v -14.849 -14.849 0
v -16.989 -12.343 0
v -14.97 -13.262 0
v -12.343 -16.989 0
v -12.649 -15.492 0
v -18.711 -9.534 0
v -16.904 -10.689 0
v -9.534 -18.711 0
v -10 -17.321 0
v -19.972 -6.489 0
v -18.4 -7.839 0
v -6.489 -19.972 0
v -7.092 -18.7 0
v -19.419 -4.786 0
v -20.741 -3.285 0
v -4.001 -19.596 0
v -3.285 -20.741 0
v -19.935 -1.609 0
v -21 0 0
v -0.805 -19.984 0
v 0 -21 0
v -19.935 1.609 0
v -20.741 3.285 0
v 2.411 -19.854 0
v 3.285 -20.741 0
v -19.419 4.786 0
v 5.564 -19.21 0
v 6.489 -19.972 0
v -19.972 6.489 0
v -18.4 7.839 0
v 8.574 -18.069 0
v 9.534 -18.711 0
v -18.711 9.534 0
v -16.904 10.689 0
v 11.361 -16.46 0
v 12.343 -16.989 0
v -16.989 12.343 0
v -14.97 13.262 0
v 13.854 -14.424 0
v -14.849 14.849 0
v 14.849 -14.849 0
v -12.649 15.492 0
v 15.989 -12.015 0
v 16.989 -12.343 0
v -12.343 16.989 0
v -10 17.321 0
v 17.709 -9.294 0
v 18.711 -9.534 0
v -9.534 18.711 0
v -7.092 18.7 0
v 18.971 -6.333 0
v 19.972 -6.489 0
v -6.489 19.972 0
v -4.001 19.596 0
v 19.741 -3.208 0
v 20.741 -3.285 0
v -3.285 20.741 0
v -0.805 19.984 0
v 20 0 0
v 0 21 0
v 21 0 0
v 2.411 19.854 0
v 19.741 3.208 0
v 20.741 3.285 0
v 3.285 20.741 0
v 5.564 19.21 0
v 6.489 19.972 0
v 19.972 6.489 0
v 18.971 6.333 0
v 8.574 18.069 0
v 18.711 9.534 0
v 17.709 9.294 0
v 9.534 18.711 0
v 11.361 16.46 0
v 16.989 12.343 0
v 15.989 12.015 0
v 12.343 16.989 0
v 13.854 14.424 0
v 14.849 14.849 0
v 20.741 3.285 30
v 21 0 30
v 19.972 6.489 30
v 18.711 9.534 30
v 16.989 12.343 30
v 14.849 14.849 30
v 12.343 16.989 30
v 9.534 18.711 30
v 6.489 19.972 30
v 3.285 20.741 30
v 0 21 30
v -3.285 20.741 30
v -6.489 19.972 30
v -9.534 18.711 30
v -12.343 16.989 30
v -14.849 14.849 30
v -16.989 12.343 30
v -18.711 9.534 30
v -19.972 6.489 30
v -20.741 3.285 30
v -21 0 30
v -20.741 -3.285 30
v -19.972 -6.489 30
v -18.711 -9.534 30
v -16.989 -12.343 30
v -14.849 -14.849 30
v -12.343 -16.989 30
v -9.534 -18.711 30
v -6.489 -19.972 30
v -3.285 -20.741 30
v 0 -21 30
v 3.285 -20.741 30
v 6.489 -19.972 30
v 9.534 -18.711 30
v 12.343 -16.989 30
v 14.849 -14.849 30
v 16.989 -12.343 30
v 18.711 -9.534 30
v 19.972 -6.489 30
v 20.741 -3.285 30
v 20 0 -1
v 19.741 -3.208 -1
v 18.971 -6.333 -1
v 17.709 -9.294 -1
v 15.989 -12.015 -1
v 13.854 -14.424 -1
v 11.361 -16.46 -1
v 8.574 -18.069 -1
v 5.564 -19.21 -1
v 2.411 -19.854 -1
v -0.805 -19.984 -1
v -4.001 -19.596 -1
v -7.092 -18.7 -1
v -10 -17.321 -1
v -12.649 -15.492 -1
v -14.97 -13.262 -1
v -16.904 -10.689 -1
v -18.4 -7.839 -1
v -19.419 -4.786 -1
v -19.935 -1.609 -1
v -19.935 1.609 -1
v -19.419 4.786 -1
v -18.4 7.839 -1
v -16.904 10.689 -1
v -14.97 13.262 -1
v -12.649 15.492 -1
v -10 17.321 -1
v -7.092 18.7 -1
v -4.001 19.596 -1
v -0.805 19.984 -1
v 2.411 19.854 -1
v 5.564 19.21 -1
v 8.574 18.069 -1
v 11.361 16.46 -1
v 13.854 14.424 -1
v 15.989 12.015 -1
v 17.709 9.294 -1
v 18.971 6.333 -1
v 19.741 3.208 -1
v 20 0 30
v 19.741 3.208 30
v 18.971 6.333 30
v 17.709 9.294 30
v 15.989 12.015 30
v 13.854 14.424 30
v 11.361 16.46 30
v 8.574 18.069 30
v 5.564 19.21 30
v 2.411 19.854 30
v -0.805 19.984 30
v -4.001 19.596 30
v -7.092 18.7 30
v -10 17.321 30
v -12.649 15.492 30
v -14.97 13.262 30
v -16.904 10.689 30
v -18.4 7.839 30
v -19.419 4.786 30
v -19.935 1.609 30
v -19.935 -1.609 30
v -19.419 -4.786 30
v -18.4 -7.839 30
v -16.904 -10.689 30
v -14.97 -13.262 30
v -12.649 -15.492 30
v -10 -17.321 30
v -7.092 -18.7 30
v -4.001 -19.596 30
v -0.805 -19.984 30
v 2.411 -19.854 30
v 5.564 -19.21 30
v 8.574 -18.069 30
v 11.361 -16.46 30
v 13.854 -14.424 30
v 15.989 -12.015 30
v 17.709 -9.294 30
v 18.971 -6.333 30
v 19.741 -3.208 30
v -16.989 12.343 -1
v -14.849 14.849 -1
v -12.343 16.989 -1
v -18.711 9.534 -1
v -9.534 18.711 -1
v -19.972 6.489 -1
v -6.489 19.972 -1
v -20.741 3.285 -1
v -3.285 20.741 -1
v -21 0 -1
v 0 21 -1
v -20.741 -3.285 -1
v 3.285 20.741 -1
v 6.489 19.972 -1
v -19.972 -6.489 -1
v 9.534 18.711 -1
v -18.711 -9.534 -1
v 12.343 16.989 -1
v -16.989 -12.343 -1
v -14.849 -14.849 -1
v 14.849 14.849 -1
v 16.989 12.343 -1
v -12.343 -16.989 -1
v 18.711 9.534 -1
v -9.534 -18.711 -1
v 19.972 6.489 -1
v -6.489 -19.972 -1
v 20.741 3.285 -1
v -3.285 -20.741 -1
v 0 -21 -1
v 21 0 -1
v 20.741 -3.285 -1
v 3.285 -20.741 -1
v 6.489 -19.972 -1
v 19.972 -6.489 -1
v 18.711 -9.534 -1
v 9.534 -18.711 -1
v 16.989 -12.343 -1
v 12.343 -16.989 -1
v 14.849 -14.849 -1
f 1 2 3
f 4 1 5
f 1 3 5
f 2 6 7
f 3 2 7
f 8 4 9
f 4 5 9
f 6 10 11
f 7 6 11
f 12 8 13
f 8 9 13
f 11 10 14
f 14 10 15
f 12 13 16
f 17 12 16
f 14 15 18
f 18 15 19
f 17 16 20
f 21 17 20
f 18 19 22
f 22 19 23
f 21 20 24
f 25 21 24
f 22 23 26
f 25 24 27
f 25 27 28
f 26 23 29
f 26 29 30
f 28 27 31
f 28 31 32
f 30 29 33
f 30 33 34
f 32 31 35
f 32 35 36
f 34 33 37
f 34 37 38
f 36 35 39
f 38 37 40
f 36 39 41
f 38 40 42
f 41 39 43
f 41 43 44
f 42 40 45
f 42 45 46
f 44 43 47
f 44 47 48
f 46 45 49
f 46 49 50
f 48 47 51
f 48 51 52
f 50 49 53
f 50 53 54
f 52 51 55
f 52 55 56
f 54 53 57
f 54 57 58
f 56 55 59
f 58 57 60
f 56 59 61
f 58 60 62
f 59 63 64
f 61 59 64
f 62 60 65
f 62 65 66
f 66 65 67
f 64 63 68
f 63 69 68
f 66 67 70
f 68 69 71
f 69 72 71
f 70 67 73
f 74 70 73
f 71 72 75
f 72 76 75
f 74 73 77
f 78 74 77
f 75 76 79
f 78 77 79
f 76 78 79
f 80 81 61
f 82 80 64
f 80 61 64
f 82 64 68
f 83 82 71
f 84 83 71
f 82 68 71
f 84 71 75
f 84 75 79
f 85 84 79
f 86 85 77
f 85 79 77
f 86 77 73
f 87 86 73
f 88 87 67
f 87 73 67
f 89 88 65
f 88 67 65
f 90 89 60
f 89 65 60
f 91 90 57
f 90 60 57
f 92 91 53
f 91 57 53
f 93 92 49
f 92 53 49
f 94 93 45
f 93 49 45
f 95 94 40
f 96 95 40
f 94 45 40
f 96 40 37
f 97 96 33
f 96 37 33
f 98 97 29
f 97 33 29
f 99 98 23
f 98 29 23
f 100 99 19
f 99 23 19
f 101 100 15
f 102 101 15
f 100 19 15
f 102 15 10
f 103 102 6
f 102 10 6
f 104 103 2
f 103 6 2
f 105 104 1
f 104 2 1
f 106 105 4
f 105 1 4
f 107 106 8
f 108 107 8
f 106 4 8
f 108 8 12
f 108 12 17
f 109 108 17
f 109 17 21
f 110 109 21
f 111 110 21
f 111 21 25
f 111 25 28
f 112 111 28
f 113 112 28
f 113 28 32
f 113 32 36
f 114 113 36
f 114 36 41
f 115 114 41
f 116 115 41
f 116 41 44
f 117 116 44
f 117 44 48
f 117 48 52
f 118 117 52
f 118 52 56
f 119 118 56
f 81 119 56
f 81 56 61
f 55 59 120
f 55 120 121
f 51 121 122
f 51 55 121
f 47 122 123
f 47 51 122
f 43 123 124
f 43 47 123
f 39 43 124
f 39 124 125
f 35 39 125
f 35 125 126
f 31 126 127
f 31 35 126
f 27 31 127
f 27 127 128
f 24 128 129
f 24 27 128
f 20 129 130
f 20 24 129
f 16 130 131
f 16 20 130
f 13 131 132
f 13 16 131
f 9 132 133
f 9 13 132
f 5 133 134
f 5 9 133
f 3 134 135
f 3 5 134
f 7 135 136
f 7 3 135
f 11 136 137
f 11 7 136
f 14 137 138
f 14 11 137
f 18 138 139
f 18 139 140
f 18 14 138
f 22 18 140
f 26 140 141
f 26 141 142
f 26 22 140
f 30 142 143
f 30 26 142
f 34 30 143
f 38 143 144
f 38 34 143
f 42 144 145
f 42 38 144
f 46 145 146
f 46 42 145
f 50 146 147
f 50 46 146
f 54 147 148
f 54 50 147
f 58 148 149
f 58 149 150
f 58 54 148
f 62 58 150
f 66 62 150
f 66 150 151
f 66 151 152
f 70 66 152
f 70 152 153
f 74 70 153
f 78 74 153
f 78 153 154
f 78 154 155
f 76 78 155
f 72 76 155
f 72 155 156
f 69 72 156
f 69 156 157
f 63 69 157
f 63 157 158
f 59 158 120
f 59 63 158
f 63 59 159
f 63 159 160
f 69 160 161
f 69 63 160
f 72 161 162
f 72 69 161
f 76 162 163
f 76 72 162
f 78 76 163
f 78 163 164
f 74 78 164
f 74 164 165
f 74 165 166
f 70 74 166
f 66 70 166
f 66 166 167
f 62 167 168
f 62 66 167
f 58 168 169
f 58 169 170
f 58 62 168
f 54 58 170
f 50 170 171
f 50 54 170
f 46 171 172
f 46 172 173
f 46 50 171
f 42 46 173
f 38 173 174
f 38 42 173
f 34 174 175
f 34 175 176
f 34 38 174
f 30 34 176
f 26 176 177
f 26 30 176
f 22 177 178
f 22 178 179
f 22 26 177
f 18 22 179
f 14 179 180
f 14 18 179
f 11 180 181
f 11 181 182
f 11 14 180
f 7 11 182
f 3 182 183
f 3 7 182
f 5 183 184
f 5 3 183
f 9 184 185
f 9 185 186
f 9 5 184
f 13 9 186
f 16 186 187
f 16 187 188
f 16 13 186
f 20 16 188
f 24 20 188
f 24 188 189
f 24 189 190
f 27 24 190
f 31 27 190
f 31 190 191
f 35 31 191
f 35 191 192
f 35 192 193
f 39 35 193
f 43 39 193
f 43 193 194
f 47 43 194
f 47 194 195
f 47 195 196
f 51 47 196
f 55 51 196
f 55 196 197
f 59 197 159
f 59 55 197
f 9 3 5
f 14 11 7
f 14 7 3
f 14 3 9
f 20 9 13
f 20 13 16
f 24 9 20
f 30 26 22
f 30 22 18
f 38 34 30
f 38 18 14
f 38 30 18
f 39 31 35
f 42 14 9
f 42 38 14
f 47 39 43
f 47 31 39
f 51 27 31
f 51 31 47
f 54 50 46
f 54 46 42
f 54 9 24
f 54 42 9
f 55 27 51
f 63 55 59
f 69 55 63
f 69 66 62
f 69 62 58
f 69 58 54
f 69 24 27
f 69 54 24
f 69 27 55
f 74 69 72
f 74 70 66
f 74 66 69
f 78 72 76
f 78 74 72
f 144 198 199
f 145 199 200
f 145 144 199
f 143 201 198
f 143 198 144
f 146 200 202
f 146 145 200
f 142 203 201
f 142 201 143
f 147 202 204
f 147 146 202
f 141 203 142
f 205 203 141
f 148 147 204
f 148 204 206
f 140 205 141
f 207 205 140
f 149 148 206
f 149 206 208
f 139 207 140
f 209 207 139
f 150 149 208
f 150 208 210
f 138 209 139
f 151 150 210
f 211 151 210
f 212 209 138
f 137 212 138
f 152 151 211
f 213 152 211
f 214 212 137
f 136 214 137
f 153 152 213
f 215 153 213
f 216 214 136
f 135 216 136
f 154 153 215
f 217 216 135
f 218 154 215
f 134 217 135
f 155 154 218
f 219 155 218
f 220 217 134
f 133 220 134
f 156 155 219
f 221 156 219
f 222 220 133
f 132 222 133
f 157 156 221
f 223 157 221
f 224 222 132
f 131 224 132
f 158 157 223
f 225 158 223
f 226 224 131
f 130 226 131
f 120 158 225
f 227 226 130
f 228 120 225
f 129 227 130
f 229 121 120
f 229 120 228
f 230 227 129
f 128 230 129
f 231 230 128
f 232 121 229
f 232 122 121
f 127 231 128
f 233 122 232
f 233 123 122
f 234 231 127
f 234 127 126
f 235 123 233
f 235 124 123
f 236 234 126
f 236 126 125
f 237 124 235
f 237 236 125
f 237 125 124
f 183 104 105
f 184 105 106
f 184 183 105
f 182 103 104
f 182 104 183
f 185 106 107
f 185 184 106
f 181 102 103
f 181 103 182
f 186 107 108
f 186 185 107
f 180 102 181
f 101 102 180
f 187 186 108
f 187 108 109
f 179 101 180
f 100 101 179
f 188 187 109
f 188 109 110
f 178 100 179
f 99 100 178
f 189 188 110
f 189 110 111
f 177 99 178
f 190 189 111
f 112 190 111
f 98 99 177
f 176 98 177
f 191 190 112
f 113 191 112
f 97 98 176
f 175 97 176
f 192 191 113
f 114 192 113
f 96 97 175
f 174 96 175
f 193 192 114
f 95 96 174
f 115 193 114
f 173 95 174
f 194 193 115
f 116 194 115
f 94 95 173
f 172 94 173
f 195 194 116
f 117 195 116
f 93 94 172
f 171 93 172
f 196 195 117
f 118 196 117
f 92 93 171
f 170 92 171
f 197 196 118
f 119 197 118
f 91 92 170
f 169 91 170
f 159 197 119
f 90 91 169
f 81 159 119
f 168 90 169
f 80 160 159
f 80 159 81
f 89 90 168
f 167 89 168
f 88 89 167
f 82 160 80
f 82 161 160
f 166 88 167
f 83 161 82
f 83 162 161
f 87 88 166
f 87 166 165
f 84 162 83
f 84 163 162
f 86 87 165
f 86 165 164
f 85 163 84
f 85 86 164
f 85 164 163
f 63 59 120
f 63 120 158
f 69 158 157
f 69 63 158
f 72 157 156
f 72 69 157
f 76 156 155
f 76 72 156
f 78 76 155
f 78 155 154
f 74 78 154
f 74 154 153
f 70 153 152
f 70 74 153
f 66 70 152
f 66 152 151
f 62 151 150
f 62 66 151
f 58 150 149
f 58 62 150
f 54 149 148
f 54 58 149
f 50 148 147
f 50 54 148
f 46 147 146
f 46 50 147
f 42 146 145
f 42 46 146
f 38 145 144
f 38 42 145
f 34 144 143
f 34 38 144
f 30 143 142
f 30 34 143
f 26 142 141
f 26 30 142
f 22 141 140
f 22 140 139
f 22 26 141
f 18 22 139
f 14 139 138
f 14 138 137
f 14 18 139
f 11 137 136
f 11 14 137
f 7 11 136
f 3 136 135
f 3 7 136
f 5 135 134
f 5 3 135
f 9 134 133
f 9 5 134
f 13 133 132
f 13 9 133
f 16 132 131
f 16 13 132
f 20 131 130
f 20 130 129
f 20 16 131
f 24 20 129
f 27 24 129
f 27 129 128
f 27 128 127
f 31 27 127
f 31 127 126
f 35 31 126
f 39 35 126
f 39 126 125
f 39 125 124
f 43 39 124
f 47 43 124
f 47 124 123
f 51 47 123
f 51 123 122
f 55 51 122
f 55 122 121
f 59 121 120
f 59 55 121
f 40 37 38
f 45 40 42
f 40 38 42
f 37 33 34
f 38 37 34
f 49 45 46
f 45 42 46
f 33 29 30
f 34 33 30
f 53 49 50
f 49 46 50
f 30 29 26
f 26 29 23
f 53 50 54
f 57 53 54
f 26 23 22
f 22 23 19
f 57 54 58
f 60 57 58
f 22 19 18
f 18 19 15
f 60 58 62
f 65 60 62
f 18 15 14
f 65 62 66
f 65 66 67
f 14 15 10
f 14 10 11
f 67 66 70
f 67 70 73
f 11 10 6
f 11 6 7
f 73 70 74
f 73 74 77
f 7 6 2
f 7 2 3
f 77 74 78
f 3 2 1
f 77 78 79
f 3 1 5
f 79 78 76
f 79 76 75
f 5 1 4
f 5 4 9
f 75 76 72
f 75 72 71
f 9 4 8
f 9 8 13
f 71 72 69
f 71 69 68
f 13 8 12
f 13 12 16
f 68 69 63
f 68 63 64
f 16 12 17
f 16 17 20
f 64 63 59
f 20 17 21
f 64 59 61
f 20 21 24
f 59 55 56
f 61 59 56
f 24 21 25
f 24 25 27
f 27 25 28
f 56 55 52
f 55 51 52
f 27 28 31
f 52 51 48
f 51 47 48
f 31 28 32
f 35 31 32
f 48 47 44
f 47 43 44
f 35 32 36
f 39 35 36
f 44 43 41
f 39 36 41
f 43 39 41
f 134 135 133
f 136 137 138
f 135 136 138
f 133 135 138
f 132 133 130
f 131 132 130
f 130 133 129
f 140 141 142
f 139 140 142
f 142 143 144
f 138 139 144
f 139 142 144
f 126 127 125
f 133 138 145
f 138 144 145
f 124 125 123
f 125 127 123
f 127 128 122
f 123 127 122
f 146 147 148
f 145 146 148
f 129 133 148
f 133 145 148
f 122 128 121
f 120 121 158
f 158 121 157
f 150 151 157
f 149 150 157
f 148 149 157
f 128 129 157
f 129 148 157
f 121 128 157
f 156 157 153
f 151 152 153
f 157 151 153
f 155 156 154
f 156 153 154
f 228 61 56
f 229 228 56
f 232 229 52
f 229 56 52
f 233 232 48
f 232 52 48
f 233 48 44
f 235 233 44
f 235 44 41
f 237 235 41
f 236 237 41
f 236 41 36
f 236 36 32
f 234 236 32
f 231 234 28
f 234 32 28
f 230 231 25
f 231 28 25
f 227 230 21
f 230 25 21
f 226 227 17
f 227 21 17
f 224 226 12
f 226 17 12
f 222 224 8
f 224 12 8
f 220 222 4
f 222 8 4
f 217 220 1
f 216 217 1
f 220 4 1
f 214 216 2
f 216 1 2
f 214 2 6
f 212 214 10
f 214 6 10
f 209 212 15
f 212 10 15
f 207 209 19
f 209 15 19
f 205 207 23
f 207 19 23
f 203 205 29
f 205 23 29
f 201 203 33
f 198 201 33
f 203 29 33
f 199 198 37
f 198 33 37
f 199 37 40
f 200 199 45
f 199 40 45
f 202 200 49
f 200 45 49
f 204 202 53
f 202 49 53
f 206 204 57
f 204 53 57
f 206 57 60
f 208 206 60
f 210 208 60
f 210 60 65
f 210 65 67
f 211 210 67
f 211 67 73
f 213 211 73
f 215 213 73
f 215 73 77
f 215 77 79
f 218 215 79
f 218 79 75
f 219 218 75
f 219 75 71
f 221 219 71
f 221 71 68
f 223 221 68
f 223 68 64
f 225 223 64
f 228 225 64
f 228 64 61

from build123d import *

# Parameters (mm, degrees)
F0_R        = 21
F0_R_2      = 20
F1_DEPTH    = 30
F2_DEPTH    = 1
F1_FACE_R   = 21
F1_FACE_R_2 = 20
F3_DEPTH    = 1


with BuildPart() as f1:
    # F0 (on Top) → F1 (new body)
    with BuildSketch(Plane.XY):
        Circle(F0_R)
        Circle(F0_R_2, mode=Mode.SUBTRACT)
    extrude(amount=F1_DEPTH)


with BuildPart() as f2:
    # F0 (on Top) → F2 (new body)
    with BuildSketch(Plane.XY):
        Circle(F0_R_2)
    extrude(amount=-F2_DEPTH)


with BuildPart() as f3:
    # F1_face (on face) → F3 (new body)
    with BuildSketch(Plane(origin=(0, 0, 0), x_dir=(1, 0, 0), z_dir=(0, 0, -1))):
        Circle(F1_FACE_R)
        Circle(F1_FACE_R_2, mode=Mode.SUBTRACT)
    extrude(amount=F3_DEPTH)


solid = Compound([f1.part, f2.part, f3.part])
